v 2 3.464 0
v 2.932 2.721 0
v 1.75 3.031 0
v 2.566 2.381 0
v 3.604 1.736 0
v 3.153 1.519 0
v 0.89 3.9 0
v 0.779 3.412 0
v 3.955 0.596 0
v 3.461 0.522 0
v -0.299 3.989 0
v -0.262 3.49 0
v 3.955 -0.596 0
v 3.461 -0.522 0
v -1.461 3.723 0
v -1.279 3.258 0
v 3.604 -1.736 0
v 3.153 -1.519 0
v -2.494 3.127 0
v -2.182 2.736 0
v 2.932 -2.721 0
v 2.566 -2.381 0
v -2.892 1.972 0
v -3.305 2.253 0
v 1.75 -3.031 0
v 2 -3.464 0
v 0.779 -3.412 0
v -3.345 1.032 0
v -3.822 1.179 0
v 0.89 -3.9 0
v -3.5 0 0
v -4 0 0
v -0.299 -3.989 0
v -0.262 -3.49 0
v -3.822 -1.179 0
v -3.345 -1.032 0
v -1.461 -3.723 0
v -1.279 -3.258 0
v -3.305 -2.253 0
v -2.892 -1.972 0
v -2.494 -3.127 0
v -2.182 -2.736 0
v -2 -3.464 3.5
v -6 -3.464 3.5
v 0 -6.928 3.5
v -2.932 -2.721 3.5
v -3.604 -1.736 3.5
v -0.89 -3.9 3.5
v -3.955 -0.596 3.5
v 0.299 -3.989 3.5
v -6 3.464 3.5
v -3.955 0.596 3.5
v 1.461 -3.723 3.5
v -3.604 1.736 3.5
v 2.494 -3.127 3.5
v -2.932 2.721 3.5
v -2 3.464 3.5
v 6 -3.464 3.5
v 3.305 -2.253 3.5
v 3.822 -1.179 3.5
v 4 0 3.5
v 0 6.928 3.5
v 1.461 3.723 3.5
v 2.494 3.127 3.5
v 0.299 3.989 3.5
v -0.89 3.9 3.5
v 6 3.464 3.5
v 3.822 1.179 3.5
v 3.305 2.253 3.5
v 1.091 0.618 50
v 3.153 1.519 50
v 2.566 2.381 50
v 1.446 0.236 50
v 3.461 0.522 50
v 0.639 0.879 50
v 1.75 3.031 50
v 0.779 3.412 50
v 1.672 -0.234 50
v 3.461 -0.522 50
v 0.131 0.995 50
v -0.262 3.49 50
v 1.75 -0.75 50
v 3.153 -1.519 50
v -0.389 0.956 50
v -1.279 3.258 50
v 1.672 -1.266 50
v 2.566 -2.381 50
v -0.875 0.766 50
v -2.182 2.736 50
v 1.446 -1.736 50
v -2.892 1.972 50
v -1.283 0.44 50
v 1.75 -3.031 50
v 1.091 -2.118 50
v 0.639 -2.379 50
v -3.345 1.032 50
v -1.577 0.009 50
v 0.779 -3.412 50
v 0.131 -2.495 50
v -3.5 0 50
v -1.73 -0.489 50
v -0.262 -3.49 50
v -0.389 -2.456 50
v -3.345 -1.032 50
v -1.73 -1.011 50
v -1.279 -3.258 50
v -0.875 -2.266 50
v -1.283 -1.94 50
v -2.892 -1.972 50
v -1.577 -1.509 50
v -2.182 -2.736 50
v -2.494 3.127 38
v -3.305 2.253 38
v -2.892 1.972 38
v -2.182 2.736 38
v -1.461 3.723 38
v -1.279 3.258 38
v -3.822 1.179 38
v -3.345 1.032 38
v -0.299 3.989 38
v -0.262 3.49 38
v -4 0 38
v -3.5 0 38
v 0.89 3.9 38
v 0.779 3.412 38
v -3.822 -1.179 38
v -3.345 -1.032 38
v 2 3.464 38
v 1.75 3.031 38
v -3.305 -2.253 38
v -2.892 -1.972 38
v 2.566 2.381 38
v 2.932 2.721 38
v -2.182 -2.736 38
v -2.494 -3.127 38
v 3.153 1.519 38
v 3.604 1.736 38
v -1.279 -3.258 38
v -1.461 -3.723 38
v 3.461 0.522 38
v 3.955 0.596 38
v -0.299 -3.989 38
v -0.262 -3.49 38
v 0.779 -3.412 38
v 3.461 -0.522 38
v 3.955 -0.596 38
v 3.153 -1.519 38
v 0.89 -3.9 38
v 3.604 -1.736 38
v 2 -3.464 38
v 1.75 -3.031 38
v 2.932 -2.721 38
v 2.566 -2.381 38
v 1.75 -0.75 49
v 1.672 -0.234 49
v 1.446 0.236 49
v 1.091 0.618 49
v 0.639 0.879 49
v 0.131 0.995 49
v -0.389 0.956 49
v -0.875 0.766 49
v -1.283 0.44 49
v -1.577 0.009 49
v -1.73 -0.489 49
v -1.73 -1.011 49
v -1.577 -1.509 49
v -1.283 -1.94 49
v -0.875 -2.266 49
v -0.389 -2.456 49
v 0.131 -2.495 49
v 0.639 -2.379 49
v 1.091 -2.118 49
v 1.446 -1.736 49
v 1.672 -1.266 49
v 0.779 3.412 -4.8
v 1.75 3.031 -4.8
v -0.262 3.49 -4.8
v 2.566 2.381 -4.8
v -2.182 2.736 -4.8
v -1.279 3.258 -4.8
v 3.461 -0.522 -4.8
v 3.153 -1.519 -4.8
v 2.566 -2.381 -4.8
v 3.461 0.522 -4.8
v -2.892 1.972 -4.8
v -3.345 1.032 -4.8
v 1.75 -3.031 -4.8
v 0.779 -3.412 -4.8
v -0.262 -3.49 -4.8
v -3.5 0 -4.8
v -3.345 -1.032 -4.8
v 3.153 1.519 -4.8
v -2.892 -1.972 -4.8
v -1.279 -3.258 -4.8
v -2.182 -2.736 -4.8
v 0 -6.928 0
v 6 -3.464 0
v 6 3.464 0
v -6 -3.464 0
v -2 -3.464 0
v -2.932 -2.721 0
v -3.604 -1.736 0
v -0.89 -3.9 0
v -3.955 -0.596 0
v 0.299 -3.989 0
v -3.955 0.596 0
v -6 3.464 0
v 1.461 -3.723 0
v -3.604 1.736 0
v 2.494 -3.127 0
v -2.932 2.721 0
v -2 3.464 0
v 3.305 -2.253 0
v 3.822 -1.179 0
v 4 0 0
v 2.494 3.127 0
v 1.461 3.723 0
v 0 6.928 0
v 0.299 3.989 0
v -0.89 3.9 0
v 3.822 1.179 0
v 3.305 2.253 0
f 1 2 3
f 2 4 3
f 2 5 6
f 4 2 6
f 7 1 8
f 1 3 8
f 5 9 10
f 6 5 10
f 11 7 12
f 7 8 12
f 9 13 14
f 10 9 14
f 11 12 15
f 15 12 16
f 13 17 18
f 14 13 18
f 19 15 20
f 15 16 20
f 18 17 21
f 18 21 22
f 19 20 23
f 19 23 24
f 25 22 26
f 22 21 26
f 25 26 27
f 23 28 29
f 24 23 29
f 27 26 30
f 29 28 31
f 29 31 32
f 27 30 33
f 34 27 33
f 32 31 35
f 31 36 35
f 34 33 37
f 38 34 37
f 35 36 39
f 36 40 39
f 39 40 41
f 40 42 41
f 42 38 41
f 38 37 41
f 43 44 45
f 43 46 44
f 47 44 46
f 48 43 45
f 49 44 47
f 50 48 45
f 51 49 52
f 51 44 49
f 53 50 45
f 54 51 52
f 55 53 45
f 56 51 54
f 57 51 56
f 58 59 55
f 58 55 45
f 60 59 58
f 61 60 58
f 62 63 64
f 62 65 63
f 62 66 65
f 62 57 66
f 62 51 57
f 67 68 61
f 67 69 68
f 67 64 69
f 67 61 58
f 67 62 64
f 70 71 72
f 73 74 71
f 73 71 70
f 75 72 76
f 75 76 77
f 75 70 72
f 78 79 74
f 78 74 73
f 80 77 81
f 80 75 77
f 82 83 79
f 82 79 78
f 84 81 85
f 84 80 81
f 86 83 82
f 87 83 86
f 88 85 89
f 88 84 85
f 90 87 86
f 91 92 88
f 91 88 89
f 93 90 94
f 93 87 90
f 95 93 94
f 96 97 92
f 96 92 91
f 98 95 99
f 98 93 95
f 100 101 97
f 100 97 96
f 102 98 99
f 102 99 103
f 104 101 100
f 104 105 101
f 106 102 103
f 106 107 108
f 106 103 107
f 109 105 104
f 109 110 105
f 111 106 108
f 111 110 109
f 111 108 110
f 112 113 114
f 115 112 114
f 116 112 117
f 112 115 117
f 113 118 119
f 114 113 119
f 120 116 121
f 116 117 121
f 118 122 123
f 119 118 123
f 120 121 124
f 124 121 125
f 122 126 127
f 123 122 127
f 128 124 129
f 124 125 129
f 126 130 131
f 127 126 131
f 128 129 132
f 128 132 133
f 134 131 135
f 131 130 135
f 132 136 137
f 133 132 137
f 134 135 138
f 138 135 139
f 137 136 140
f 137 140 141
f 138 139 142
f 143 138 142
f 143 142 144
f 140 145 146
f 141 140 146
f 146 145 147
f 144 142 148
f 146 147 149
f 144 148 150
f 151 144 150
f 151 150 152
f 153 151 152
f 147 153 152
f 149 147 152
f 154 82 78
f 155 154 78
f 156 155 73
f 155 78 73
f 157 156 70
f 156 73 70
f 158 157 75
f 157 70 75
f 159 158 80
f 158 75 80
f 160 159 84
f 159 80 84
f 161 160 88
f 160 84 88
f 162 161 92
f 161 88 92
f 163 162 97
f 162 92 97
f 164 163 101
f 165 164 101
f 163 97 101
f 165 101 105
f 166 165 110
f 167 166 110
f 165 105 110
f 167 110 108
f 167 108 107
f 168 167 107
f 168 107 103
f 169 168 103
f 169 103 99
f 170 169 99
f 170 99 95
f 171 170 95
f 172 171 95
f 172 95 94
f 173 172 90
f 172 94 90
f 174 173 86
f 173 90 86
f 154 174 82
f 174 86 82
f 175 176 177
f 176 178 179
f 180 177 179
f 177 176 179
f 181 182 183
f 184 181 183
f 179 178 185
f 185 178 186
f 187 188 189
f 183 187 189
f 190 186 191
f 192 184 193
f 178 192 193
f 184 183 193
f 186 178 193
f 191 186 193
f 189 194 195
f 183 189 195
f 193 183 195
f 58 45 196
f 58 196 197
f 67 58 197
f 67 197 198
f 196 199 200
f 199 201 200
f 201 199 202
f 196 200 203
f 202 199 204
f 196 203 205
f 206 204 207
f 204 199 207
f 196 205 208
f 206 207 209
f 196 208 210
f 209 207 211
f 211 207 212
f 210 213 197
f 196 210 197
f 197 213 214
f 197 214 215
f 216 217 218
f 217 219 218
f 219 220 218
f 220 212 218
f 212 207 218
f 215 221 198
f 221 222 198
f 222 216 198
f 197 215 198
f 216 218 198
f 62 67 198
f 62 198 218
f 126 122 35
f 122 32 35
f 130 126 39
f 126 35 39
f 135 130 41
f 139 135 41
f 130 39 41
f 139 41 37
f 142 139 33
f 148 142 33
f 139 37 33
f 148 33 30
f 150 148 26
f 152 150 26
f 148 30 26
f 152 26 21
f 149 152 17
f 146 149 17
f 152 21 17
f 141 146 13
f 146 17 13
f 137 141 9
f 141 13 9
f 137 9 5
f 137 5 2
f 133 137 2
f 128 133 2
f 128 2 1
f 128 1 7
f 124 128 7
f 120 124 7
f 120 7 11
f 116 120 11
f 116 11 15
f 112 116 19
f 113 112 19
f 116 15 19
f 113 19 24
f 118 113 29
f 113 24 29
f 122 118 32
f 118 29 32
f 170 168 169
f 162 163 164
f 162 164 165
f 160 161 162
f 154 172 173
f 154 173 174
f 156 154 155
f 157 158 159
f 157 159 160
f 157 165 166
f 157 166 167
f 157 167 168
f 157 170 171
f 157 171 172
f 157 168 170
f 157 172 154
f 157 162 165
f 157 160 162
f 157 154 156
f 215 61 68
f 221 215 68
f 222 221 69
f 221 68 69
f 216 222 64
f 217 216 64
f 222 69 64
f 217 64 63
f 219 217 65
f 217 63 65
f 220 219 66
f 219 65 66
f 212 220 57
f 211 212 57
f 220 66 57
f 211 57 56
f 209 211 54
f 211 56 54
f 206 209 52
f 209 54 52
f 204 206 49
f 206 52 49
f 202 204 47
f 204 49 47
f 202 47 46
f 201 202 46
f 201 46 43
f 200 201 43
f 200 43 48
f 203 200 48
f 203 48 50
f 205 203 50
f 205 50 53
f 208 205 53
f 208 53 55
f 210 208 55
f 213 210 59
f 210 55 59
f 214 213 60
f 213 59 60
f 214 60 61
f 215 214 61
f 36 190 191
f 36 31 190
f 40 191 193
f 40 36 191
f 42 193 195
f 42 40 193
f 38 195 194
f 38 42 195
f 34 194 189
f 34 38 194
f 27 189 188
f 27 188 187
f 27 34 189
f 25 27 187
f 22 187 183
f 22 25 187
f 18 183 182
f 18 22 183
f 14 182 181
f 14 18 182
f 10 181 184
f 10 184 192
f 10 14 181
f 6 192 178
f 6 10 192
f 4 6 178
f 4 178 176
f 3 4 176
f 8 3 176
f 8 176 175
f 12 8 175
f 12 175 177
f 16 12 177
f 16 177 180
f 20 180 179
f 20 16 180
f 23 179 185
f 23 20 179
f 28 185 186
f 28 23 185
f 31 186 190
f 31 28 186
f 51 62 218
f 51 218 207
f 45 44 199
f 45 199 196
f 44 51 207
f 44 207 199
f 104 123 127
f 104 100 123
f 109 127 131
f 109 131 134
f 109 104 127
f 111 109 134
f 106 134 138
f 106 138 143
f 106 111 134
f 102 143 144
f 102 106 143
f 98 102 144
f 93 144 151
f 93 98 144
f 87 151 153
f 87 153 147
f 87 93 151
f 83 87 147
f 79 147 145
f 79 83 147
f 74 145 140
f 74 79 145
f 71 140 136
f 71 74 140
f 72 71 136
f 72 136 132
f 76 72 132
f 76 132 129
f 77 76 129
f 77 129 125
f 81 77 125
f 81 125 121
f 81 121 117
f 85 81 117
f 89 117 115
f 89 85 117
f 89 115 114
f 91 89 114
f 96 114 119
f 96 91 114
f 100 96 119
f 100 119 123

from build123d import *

# Parameters (mm, degrees)
F0_W     = 3.5
F0_H     = 4.8
F0_H_2   = 12
F2_R     = 1.75
F3_DEPTH = 1
F4_START = -46.5
F2_R_2   = 4
F4_DEPTH = 3.5


with BuildPart() as f1:
    # F0 (on Front) → F1 (revolve)
    with BuildSketch(Plane.XZ):
        Polygon((-3.5, 0), (0, 0), (0, 38), (-3.5, 38), (-4, 38), (-4, 0), align=None)
        with Locations((-1.75, -2.4)):
            Rectangle(F0_W, F0_H)
        with Locations((-1.75, 44)):
            Rectangle(F0_W, F0_H_2)
    revolve(axis=Axis((0, 0, 19), (0, 0, 1)))

    # F2 (on face) → F3 (cut)
    with BuildSketch(Plane.XY.offset(50)):
        with Locations((0, -0.75)):
            Circle(F2_R)
    extrude(amount=-F3_DEPTH, mode=Mode.SUBTRACT)


with BuildPart() as f4:
    # F2 (on face) → F4 (new body)
    with BuildSketch(Plane.XY.offset(50).offset(F4_START)):
        Polygon((6, -3.4641016151), (6, 3.4641016151), (0, 6.9282032303), (-6, 3.4641016151), (-6, -3.4641016151), (0, -6.9282032303), align=None)
        Circle(F2_R_2, mode=Mode.SUBTRACT)
    extrude(amount=-F4_DEPTH)


solid = Compound([f1.part, f4.part])
